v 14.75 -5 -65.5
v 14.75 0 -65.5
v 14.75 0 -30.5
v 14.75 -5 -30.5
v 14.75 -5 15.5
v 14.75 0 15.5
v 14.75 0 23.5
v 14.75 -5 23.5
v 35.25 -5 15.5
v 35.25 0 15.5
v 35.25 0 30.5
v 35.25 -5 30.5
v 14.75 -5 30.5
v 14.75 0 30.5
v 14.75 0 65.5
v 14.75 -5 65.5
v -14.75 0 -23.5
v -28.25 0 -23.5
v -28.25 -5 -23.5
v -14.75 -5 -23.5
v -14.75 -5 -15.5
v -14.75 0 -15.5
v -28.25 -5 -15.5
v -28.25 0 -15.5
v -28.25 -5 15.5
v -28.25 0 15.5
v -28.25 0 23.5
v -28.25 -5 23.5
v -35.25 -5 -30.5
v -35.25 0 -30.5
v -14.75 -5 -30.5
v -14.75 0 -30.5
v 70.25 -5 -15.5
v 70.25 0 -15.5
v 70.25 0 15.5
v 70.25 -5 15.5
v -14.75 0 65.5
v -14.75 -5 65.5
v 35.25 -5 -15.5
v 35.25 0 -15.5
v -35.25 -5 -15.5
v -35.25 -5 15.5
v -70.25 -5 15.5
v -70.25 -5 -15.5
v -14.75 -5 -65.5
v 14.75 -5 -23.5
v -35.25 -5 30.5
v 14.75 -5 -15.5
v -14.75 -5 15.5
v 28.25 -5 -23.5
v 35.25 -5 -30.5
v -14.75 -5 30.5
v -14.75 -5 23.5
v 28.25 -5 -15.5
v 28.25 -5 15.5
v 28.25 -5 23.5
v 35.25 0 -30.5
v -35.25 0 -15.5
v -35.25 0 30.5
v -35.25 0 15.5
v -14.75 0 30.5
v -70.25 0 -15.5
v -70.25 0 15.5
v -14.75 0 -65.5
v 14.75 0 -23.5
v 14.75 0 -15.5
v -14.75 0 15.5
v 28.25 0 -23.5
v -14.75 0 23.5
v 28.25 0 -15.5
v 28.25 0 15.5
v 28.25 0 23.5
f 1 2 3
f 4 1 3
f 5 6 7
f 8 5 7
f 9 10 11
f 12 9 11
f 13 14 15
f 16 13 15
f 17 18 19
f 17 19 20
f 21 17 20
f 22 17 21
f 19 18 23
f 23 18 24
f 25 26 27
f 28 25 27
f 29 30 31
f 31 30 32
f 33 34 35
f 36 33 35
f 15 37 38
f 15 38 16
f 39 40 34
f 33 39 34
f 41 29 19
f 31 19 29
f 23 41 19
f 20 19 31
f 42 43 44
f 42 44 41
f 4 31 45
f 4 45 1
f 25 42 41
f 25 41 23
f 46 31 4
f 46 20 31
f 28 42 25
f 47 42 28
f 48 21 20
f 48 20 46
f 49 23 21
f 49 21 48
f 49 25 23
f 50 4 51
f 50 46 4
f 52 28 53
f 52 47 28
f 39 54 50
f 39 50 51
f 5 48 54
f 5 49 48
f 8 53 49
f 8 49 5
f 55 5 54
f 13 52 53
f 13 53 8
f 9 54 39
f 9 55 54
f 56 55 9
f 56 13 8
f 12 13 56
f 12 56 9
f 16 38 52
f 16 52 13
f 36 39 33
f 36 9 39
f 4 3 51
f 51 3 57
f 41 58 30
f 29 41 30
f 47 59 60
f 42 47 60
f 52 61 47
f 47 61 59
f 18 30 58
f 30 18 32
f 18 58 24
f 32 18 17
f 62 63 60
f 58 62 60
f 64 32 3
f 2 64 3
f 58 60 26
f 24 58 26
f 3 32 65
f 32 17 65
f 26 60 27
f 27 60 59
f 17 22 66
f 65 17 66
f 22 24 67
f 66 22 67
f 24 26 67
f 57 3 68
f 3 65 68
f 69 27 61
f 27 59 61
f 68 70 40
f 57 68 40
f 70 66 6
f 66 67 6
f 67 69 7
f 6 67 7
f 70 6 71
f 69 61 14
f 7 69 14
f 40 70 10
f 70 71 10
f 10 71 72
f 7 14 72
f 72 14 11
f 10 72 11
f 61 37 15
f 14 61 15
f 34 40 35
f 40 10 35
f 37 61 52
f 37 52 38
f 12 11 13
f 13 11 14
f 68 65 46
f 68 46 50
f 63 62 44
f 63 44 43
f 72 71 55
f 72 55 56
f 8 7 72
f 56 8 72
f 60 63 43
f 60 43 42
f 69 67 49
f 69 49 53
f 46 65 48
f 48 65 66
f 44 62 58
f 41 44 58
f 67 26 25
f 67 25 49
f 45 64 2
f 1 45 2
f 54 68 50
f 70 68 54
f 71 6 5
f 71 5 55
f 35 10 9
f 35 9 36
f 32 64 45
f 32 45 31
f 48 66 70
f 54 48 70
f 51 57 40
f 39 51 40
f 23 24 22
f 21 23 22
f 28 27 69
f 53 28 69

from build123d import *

# Parameters (mm, degrees)
F0_W     = 35
F0_H     = 31
F0_W_2   = 13.5
F0_H_2   = 8
F0_W_3   = 29.5
F0_H_3   = 35
F1_DEPTH = 5


with BuildPart() as f1:
    # F0 (on Front) → F1 (new body)
    with BuildSketch(Plane.XZ):
        with Locations((-52.75, 0)):
            Rectangle(F0_W, F0_H)
        Polygon((-14.75, 30.5), (-35.25, 30.5), (-35.25, 15.5), (-35.25, -15.5), (-35.25, -30.5), (-14.75, -30.5), (14.75, -30.5), (35.25, -30.5), (35.25, -15.5), (35.25, 15.5), (35.25, 30.5), (14.75, 30.5), align=None)
        with Locations((-21.5, -19.5)):
            Rectangle(F0_W_2, F0_H_2, mode=Mode.SUBTRACT)
        with Locations((21.5, -19.5)):
            Rectangle(F0_W_2, F0_H_2, mode=Mode.SUBTRACT)
        with Locations((-21.5, 19.5)):
            Rectangle(F0_W_2, F0_H_2, mode=Mode.SUBTRACT)
        with Locations((21.5, 19.5)):
            Rectangle(F0_W_2, F0_H_2, mode=Mode.SUBTRACT)
        with Locations((0, 48)):
            Rectangle(F0_W_3, F0_H_3)
        with Locations((0, -48)):
            Rectangle(F0_W_3, F0_H_3)
        with Locations((52.75, 0)):
            Rectangle(F0_W, F0_H)
    extrude(amount=F1_DEPTH)


solid = f1.part
